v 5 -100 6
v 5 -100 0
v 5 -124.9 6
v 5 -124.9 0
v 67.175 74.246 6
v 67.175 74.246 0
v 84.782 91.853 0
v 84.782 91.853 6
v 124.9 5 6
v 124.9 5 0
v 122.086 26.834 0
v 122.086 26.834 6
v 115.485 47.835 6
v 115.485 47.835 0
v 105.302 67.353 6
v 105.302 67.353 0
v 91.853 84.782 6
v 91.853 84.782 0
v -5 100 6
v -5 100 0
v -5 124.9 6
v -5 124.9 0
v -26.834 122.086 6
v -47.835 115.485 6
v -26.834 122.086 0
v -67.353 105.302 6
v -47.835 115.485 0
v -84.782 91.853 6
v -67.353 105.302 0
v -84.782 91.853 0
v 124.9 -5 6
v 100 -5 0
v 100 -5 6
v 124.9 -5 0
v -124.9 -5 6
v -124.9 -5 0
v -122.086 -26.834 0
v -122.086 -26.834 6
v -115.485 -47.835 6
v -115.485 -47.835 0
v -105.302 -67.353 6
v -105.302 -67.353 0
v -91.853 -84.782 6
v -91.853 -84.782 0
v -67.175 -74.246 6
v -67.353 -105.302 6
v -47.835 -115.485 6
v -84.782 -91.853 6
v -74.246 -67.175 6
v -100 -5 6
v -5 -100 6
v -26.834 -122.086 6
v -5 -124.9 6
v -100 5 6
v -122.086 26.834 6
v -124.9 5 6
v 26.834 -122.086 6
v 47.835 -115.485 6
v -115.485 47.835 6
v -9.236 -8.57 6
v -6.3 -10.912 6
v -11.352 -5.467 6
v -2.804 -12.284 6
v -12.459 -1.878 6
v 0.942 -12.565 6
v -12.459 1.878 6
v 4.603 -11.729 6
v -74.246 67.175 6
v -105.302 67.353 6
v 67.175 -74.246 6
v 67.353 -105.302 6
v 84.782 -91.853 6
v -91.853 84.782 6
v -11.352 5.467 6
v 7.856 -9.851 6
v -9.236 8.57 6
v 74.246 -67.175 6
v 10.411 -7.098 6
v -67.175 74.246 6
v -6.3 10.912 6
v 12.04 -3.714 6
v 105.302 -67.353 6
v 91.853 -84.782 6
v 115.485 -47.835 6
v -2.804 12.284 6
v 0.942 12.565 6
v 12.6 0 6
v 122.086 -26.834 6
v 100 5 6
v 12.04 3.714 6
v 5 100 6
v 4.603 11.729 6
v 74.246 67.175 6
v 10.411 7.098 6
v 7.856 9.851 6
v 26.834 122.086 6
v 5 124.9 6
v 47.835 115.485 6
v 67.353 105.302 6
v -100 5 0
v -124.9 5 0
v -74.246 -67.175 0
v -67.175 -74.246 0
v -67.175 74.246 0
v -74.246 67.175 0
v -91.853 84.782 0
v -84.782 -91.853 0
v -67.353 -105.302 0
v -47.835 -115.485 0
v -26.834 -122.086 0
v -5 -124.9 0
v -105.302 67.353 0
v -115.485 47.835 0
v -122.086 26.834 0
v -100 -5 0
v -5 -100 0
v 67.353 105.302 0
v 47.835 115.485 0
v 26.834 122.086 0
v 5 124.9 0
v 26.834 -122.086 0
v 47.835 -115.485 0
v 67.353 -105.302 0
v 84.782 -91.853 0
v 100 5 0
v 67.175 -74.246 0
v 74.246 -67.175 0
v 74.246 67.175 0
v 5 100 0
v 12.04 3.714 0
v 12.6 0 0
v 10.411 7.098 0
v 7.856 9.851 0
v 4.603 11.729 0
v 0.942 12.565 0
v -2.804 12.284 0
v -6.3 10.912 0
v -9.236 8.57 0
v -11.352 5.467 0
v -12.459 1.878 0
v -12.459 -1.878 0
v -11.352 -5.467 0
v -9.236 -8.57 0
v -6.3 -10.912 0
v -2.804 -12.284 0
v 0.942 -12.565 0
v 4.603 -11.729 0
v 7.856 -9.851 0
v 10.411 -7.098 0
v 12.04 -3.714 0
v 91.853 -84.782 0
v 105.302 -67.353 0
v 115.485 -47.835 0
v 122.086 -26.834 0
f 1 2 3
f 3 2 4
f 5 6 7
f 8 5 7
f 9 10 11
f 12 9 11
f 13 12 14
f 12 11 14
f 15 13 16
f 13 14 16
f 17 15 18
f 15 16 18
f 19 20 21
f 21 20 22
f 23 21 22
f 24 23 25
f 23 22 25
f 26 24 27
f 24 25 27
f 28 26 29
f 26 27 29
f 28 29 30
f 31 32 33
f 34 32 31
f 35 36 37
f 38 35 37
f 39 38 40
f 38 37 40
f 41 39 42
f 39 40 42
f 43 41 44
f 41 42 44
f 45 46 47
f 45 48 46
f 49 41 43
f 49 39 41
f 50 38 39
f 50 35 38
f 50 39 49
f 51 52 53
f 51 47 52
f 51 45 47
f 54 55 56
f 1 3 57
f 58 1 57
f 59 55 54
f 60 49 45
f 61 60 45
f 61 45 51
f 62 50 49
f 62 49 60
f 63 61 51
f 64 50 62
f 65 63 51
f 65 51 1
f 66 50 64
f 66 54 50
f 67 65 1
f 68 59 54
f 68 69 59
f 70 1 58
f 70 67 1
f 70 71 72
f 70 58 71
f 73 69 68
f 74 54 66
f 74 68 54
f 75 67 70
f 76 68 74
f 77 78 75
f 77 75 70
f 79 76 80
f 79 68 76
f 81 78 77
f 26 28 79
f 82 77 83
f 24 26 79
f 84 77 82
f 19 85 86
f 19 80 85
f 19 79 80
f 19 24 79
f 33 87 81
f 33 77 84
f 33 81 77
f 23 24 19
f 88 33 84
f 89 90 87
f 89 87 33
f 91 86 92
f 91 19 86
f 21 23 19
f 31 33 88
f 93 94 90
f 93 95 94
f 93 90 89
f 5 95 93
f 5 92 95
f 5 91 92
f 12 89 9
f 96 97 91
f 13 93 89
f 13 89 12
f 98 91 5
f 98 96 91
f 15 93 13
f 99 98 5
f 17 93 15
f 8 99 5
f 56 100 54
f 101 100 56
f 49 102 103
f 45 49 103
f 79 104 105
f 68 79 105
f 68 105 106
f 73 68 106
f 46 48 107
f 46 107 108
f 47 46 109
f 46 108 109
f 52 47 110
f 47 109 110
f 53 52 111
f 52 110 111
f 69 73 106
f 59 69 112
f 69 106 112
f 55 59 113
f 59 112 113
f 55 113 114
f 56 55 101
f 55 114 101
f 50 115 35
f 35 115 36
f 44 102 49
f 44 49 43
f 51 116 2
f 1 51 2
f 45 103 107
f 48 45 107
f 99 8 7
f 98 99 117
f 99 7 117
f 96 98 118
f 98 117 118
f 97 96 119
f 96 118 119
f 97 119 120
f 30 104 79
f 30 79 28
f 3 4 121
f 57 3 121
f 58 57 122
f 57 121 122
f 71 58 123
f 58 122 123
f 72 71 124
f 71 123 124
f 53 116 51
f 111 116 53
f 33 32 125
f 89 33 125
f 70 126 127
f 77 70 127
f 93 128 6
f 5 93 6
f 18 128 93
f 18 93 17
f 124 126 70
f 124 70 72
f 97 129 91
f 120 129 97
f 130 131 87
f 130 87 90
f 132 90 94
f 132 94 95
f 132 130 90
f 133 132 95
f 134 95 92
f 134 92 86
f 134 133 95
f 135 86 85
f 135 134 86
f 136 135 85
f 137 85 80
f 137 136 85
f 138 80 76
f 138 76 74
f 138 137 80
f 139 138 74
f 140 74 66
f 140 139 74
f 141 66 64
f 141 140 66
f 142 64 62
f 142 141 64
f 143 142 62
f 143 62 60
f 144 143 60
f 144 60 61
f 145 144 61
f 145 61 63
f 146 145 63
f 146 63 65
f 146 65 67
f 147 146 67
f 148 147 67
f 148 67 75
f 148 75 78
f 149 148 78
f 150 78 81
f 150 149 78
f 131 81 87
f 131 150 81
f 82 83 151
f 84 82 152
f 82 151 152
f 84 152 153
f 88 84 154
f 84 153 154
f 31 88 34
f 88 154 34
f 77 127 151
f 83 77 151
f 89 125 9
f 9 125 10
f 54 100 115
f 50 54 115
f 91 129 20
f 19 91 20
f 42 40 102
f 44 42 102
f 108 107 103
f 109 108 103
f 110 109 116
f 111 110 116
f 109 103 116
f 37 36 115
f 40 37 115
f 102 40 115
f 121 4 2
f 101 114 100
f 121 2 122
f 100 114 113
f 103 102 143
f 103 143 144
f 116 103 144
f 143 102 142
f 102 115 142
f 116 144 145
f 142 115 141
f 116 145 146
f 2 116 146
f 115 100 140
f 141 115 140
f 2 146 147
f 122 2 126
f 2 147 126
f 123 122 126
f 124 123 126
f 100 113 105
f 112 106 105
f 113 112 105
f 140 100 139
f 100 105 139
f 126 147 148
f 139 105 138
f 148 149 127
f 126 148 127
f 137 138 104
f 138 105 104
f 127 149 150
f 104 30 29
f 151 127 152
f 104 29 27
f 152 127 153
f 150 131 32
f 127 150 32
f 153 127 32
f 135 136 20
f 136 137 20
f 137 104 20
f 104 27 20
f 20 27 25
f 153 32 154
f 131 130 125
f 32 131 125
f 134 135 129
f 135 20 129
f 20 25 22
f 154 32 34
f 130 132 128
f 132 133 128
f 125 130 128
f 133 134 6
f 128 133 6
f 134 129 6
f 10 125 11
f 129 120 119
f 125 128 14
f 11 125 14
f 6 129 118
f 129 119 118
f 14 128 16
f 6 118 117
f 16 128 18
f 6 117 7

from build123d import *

# Parameters (mm, degrees)
ESQUISSE1_R                  = 125
ESQUISSE1_R_2                = 12.6
BOSS_EXTRU_1_DEPTH           = 6
ESQUISSE2_W                  = 10
ESQUISSE2_H                  = 25
ENL_V_MAT_EXTRU_1_DEPTH      = 7
R_P_TITION_CIRCULAIRE1_COUNT = 8


with BuildPart() as part:
    # Esquisse1 → Boss.-Extru.1 (new body)
    with BuildSketch(Plane.XY):
        Circle(ESQUISSE1_R)
        Circle(ESQUISSE1_R_2, mode=Mode.SUBTRACT)
    extrude(amount=BOSS_EXTRU_1_DEPTH)

    # Esquisse2 → Enlèv. mat.-Extru.1 (cut, through all)
    with BuildSketch(Plane(origin=(0, 0, 0), x_dir=(-1, 0, 0), z_dir=(0, 0, -1))):
        with Locations((0, 112.5)):
            Rectangle(ESQUISSE2_W, ESQUISSE2_H)
    enl_v_mat_extru_1 = extrude(amount=-ENL_V_MAT_EXTRU_1_DEPTH, mode=Mode.SUBTRACT)

    # Répétition circulaire1: Enlèv. mat.-Extru.1 ×8 about axis
    r_p_tition_circulaire1_axis = Axis((0, 0, 0), (0, 0, 1))
    for i in range(1, R_P_TITION_CIRCULAIRE1_COUNT):
        add(enl_v_mat_extru_1.rotate(r_p_tition_circulaire1_axis, i * 360 / R_P_TITION_CIRCULAIRE1_COUNT), mode=Mode.SUBTRACT)


solid = part.part
